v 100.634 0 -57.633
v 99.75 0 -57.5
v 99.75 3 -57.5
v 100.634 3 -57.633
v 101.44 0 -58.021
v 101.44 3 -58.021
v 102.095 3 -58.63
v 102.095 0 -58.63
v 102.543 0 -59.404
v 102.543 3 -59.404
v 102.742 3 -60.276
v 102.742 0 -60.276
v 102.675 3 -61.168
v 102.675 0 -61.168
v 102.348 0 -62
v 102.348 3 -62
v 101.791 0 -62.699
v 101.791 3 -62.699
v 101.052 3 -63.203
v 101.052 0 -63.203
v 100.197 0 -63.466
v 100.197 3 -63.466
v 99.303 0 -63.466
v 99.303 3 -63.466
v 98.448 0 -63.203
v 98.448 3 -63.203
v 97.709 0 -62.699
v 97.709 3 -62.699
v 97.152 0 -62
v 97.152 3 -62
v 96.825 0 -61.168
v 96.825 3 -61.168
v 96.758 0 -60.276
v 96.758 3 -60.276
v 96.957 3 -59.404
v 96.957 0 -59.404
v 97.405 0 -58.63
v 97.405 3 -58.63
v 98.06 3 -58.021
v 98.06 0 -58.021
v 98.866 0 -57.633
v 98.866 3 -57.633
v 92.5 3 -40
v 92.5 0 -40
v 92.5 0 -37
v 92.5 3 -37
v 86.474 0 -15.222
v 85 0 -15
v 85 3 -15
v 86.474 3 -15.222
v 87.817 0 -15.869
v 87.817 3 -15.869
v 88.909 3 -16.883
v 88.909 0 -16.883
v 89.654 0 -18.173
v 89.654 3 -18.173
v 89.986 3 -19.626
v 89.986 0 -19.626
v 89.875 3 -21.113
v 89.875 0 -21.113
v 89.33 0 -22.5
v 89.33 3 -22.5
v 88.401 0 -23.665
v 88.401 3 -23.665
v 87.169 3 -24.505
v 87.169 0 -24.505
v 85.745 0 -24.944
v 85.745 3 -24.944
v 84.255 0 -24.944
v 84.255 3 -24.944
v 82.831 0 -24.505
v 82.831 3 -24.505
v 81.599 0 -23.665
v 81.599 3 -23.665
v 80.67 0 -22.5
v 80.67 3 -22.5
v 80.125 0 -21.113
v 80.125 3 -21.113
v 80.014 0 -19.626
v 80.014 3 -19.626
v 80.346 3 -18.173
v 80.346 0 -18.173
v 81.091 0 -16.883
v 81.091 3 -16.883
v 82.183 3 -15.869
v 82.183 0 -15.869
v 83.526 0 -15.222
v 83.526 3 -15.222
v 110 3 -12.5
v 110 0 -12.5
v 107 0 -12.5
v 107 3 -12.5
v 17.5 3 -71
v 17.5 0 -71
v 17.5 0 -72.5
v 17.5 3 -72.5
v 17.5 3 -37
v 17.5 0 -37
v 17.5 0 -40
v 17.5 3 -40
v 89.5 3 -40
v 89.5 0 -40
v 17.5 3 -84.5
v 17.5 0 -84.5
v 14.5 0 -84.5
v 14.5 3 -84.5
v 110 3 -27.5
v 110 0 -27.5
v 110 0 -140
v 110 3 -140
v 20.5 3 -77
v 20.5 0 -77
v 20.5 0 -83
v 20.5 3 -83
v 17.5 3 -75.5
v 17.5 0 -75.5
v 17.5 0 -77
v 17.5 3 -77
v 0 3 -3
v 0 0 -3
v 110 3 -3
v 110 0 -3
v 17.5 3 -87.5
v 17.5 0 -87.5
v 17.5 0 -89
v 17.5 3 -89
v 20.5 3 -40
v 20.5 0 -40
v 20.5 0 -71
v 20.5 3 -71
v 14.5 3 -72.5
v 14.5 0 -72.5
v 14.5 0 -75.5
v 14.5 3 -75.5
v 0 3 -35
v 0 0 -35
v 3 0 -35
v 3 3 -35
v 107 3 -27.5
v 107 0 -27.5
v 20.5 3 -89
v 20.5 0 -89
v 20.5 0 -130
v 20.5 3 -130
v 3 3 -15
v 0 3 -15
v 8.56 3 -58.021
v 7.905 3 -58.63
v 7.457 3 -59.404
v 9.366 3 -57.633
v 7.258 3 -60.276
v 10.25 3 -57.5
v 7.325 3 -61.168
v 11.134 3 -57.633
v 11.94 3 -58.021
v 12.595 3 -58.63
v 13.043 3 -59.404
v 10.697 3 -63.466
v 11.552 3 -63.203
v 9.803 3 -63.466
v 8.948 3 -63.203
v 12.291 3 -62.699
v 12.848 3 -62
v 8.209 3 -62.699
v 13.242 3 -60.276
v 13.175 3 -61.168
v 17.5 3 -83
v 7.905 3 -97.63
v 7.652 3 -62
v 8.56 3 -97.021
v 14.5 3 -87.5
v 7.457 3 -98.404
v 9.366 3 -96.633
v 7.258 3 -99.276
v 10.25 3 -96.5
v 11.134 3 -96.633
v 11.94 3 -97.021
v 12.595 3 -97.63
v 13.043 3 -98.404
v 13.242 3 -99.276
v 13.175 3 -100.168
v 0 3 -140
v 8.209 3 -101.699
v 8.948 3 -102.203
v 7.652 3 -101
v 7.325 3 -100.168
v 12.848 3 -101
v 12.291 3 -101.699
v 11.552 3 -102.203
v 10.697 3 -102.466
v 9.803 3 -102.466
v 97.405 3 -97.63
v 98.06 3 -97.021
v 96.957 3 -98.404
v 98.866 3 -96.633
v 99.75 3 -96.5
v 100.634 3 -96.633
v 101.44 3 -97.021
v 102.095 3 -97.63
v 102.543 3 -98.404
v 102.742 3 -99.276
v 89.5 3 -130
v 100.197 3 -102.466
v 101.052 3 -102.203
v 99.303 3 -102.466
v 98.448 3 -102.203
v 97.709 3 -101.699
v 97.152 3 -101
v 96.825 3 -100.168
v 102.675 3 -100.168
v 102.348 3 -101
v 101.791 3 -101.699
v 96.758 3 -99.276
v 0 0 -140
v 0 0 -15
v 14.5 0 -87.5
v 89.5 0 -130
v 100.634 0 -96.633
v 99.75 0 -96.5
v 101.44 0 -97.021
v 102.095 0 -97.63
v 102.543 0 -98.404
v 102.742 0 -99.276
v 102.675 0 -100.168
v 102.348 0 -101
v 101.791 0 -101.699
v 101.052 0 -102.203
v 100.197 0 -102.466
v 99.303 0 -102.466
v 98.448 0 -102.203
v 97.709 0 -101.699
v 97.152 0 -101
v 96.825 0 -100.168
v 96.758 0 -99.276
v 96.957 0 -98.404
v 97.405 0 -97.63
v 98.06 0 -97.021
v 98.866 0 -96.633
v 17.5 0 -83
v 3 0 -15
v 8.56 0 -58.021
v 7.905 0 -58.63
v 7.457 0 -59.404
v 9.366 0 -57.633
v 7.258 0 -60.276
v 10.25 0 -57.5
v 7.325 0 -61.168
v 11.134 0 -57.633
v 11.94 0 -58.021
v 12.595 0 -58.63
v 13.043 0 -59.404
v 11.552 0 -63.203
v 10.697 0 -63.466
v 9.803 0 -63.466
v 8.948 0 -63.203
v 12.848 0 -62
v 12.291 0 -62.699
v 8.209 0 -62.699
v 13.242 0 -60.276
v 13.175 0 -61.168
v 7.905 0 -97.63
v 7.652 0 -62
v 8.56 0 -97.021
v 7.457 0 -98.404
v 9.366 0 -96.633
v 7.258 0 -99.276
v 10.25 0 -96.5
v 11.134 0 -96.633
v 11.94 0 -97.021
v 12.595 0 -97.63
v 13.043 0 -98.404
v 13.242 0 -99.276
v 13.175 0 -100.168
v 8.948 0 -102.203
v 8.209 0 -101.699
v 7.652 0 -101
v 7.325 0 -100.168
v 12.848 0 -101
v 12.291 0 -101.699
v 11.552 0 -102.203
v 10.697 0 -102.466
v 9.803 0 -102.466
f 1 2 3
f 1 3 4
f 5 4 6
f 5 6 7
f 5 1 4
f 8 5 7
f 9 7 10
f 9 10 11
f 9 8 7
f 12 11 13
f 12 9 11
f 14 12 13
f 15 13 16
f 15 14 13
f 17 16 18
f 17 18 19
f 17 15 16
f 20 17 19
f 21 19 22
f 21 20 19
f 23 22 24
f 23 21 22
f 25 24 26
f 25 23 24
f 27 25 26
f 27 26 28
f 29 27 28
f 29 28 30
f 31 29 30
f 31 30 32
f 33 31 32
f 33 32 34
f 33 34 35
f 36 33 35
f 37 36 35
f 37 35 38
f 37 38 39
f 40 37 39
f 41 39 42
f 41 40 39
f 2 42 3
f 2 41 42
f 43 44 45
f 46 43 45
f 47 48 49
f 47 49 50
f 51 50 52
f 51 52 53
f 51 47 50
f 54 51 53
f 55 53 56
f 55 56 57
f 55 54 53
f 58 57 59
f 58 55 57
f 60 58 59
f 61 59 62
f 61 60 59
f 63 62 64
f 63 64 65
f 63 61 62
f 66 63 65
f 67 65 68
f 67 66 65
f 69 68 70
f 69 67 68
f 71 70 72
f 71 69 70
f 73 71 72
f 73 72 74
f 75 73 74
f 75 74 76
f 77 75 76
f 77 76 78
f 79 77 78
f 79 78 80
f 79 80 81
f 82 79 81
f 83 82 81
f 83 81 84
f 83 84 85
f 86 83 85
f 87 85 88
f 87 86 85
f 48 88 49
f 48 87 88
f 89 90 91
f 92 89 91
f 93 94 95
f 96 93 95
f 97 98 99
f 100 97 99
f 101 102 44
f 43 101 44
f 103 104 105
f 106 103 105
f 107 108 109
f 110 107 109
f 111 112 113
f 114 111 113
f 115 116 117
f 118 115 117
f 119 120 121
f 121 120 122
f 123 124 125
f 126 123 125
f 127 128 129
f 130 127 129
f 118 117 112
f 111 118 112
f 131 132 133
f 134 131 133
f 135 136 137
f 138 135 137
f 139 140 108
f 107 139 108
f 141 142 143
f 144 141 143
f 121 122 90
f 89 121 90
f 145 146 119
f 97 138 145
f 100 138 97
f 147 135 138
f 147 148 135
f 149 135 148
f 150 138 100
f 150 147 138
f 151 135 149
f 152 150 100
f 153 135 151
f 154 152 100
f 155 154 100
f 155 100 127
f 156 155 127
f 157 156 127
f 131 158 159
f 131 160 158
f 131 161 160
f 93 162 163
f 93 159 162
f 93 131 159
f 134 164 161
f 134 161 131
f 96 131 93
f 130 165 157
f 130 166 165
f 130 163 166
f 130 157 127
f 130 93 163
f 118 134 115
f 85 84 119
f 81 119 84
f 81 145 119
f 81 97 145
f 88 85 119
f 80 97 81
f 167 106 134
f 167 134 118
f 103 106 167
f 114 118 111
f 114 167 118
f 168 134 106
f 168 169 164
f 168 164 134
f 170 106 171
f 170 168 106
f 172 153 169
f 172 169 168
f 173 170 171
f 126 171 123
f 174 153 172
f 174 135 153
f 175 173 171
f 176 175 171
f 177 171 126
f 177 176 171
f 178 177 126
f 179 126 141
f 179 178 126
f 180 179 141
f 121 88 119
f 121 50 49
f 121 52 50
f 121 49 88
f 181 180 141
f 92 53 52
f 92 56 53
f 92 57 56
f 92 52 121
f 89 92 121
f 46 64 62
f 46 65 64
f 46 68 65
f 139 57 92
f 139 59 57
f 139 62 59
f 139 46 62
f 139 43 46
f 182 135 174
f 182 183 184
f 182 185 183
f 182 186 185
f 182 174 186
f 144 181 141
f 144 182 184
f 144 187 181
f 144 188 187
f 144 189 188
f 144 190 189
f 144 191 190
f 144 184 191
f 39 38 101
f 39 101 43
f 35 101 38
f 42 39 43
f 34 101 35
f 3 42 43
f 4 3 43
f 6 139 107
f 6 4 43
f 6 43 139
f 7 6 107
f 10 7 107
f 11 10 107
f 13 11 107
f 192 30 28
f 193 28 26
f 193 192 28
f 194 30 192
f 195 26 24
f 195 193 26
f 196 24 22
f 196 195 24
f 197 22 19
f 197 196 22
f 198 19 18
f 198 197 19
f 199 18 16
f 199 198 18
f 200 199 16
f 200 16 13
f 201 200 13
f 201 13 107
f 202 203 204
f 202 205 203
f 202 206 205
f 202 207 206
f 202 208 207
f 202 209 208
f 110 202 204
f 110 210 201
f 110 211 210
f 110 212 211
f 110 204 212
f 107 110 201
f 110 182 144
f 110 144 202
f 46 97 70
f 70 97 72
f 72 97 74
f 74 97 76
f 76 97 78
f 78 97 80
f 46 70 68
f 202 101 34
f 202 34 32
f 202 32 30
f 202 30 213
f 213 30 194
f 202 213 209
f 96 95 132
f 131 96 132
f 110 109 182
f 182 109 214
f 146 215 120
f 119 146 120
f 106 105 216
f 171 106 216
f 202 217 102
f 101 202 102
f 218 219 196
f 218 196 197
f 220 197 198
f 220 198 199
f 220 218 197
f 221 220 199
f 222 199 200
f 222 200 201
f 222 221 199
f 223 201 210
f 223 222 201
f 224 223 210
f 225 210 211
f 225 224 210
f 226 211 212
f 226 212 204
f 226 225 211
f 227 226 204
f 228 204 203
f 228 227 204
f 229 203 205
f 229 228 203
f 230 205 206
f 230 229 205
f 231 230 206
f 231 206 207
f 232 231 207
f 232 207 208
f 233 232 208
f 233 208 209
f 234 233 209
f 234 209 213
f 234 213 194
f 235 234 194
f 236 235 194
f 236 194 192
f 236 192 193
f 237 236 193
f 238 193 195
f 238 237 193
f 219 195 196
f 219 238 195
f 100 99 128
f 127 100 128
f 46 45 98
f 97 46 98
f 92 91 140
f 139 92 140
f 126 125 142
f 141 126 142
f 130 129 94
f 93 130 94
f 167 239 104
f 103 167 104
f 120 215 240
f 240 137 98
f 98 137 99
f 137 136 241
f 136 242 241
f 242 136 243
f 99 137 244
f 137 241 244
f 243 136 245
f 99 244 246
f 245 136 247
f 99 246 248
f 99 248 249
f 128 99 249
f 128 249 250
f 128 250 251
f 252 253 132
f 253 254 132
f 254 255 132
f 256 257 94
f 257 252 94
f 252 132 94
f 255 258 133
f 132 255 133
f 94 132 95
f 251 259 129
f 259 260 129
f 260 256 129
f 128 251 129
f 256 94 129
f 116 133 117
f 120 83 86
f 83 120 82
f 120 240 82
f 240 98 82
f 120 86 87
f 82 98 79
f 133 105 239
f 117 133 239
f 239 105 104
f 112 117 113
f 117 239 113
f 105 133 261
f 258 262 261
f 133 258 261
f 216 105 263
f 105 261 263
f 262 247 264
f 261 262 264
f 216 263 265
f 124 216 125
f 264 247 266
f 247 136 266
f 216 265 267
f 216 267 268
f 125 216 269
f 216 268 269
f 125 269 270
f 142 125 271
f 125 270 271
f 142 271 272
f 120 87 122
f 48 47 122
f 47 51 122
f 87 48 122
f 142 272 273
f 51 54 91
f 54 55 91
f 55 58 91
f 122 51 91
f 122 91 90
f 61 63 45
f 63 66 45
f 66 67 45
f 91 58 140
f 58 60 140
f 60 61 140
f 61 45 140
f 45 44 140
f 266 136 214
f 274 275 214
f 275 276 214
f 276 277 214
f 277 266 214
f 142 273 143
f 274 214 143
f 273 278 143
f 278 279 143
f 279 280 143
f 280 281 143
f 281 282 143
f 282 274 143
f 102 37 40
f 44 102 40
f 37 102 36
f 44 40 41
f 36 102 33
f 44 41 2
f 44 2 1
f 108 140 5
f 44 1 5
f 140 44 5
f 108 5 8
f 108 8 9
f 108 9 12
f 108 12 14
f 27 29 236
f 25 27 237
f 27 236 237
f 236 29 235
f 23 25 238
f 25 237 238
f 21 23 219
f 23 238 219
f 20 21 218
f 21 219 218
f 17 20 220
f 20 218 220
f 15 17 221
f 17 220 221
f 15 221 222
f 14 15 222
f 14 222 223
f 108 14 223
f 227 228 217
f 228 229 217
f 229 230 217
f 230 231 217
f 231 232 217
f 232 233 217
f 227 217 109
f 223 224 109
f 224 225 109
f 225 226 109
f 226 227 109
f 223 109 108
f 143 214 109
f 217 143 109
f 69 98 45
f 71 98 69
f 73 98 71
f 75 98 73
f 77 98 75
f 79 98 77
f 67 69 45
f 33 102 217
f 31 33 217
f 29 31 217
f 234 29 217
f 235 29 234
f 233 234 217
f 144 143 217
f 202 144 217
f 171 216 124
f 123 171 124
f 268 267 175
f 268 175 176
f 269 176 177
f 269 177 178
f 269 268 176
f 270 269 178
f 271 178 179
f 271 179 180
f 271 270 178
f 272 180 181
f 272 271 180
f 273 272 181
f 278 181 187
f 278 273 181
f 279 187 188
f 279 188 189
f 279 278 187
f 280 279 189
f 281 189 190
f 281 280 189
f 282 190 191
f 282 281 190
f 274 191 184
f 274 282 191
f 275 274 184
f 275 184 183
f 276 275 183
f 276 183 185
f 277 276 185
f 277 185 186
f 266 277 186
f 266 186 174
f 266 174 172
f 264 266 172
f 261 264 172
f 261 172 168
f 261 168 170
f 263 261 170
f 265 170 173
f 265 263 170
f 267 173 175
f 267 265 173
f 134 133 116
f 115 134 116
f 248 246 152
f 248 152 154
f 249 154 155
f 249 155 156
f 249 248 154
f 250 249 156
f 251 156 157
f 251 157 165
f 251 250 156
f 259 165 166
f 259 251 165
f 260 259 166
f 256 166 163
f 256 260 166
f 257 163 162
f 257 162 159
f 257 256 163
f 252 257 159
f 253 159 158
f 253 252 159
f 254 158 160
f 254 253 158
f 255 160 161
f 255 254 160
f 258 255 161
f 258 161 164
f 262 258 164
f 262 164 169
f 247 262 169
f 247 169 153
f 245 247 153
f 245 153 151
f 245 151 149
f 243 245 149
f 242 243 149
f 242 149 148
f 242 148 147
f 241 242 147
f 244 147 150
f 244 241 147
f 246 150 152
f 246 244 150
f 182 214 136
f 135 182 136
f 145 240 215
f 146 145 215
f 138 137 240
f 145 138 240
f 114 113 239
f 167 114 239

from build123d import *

# Parameters (mm, degrees)
CROQUIS1_R              = 3
CROQUIS1_R_2            = 5
SALIENTE_EXTRUIR1_DEPTH = 3


with BuildPart() as part:
    # Croquis1 → Saliente-Extruir1 (new body)
    with BuildSketch(Plane(origin=(0, 0, 0), x_dir=(1, 0, 0), z_dir=(0, 1, 0))):
        Polygon((0, 3), (110, 3), (110, 12.5), (107, 12.5), (107, 20), (107, 27.5), (110, 27.5), (110, 37), (110, 140), (89.5, 140), (20.5, 140), (0, 140), (0, 50), (0, 35), (3, 35), (3, 20), (3, 15), (0, 15), align=None)
        with Locations(Location((10.25, 60.5, 0), (0, 0, 270))):
            Circle(CROQUIS1_R, mode=Mode.SUBTRACT)
        with Locations(Location((85, 20, 0), (0, 0, 270))):
            Circle(CROQUIS1_R_2, mode=Mode.SUBTRACT)
        with Locations(Location((99.75, 60.5, 0), (0, 0, 270))):
            Circle(CROQUIS1_R, mode=Mode.SUBTRACT)
        with Locations(Location((10.25, 99.5, 0), (0, 0, 270))):
            Circle(CROQUIS1_R, mode=Mode.SUBTRACT)
        Polygon((92.5, 37), (89.5, 37), (20.5, 37), (17.5, 37), (17.5, 40), (20.5, 40), (20.5, 71), (17.5, 71), (17.5, 72.5), (14.5, 72.5), (14.5, 75.5), (17.5, 75.5), (17.5, 77), (20.5, 77), (20.5, 83), (17.5, 83), (17.5, 84.5), (14.5, 84.5), (14.5, 87.5), (17.5, 87.5), (17.5, 89), (20.5, 89), (20.5, 130), (89.5, 130), (89.5, 89), (89.5, 71), (89.5, 40), (92.5, 40), align=None, mode=Mode.SUBTRACT)
        with Locations(Location((99.75, 99.5, 0), (0, 0, 270))):
            Circle(CROQUIS1_R, mode=Mode.SUBTRACT)
    extrude(amount=SALIENTE_EXTRUIR1_DEPTH)


solid = part.part
